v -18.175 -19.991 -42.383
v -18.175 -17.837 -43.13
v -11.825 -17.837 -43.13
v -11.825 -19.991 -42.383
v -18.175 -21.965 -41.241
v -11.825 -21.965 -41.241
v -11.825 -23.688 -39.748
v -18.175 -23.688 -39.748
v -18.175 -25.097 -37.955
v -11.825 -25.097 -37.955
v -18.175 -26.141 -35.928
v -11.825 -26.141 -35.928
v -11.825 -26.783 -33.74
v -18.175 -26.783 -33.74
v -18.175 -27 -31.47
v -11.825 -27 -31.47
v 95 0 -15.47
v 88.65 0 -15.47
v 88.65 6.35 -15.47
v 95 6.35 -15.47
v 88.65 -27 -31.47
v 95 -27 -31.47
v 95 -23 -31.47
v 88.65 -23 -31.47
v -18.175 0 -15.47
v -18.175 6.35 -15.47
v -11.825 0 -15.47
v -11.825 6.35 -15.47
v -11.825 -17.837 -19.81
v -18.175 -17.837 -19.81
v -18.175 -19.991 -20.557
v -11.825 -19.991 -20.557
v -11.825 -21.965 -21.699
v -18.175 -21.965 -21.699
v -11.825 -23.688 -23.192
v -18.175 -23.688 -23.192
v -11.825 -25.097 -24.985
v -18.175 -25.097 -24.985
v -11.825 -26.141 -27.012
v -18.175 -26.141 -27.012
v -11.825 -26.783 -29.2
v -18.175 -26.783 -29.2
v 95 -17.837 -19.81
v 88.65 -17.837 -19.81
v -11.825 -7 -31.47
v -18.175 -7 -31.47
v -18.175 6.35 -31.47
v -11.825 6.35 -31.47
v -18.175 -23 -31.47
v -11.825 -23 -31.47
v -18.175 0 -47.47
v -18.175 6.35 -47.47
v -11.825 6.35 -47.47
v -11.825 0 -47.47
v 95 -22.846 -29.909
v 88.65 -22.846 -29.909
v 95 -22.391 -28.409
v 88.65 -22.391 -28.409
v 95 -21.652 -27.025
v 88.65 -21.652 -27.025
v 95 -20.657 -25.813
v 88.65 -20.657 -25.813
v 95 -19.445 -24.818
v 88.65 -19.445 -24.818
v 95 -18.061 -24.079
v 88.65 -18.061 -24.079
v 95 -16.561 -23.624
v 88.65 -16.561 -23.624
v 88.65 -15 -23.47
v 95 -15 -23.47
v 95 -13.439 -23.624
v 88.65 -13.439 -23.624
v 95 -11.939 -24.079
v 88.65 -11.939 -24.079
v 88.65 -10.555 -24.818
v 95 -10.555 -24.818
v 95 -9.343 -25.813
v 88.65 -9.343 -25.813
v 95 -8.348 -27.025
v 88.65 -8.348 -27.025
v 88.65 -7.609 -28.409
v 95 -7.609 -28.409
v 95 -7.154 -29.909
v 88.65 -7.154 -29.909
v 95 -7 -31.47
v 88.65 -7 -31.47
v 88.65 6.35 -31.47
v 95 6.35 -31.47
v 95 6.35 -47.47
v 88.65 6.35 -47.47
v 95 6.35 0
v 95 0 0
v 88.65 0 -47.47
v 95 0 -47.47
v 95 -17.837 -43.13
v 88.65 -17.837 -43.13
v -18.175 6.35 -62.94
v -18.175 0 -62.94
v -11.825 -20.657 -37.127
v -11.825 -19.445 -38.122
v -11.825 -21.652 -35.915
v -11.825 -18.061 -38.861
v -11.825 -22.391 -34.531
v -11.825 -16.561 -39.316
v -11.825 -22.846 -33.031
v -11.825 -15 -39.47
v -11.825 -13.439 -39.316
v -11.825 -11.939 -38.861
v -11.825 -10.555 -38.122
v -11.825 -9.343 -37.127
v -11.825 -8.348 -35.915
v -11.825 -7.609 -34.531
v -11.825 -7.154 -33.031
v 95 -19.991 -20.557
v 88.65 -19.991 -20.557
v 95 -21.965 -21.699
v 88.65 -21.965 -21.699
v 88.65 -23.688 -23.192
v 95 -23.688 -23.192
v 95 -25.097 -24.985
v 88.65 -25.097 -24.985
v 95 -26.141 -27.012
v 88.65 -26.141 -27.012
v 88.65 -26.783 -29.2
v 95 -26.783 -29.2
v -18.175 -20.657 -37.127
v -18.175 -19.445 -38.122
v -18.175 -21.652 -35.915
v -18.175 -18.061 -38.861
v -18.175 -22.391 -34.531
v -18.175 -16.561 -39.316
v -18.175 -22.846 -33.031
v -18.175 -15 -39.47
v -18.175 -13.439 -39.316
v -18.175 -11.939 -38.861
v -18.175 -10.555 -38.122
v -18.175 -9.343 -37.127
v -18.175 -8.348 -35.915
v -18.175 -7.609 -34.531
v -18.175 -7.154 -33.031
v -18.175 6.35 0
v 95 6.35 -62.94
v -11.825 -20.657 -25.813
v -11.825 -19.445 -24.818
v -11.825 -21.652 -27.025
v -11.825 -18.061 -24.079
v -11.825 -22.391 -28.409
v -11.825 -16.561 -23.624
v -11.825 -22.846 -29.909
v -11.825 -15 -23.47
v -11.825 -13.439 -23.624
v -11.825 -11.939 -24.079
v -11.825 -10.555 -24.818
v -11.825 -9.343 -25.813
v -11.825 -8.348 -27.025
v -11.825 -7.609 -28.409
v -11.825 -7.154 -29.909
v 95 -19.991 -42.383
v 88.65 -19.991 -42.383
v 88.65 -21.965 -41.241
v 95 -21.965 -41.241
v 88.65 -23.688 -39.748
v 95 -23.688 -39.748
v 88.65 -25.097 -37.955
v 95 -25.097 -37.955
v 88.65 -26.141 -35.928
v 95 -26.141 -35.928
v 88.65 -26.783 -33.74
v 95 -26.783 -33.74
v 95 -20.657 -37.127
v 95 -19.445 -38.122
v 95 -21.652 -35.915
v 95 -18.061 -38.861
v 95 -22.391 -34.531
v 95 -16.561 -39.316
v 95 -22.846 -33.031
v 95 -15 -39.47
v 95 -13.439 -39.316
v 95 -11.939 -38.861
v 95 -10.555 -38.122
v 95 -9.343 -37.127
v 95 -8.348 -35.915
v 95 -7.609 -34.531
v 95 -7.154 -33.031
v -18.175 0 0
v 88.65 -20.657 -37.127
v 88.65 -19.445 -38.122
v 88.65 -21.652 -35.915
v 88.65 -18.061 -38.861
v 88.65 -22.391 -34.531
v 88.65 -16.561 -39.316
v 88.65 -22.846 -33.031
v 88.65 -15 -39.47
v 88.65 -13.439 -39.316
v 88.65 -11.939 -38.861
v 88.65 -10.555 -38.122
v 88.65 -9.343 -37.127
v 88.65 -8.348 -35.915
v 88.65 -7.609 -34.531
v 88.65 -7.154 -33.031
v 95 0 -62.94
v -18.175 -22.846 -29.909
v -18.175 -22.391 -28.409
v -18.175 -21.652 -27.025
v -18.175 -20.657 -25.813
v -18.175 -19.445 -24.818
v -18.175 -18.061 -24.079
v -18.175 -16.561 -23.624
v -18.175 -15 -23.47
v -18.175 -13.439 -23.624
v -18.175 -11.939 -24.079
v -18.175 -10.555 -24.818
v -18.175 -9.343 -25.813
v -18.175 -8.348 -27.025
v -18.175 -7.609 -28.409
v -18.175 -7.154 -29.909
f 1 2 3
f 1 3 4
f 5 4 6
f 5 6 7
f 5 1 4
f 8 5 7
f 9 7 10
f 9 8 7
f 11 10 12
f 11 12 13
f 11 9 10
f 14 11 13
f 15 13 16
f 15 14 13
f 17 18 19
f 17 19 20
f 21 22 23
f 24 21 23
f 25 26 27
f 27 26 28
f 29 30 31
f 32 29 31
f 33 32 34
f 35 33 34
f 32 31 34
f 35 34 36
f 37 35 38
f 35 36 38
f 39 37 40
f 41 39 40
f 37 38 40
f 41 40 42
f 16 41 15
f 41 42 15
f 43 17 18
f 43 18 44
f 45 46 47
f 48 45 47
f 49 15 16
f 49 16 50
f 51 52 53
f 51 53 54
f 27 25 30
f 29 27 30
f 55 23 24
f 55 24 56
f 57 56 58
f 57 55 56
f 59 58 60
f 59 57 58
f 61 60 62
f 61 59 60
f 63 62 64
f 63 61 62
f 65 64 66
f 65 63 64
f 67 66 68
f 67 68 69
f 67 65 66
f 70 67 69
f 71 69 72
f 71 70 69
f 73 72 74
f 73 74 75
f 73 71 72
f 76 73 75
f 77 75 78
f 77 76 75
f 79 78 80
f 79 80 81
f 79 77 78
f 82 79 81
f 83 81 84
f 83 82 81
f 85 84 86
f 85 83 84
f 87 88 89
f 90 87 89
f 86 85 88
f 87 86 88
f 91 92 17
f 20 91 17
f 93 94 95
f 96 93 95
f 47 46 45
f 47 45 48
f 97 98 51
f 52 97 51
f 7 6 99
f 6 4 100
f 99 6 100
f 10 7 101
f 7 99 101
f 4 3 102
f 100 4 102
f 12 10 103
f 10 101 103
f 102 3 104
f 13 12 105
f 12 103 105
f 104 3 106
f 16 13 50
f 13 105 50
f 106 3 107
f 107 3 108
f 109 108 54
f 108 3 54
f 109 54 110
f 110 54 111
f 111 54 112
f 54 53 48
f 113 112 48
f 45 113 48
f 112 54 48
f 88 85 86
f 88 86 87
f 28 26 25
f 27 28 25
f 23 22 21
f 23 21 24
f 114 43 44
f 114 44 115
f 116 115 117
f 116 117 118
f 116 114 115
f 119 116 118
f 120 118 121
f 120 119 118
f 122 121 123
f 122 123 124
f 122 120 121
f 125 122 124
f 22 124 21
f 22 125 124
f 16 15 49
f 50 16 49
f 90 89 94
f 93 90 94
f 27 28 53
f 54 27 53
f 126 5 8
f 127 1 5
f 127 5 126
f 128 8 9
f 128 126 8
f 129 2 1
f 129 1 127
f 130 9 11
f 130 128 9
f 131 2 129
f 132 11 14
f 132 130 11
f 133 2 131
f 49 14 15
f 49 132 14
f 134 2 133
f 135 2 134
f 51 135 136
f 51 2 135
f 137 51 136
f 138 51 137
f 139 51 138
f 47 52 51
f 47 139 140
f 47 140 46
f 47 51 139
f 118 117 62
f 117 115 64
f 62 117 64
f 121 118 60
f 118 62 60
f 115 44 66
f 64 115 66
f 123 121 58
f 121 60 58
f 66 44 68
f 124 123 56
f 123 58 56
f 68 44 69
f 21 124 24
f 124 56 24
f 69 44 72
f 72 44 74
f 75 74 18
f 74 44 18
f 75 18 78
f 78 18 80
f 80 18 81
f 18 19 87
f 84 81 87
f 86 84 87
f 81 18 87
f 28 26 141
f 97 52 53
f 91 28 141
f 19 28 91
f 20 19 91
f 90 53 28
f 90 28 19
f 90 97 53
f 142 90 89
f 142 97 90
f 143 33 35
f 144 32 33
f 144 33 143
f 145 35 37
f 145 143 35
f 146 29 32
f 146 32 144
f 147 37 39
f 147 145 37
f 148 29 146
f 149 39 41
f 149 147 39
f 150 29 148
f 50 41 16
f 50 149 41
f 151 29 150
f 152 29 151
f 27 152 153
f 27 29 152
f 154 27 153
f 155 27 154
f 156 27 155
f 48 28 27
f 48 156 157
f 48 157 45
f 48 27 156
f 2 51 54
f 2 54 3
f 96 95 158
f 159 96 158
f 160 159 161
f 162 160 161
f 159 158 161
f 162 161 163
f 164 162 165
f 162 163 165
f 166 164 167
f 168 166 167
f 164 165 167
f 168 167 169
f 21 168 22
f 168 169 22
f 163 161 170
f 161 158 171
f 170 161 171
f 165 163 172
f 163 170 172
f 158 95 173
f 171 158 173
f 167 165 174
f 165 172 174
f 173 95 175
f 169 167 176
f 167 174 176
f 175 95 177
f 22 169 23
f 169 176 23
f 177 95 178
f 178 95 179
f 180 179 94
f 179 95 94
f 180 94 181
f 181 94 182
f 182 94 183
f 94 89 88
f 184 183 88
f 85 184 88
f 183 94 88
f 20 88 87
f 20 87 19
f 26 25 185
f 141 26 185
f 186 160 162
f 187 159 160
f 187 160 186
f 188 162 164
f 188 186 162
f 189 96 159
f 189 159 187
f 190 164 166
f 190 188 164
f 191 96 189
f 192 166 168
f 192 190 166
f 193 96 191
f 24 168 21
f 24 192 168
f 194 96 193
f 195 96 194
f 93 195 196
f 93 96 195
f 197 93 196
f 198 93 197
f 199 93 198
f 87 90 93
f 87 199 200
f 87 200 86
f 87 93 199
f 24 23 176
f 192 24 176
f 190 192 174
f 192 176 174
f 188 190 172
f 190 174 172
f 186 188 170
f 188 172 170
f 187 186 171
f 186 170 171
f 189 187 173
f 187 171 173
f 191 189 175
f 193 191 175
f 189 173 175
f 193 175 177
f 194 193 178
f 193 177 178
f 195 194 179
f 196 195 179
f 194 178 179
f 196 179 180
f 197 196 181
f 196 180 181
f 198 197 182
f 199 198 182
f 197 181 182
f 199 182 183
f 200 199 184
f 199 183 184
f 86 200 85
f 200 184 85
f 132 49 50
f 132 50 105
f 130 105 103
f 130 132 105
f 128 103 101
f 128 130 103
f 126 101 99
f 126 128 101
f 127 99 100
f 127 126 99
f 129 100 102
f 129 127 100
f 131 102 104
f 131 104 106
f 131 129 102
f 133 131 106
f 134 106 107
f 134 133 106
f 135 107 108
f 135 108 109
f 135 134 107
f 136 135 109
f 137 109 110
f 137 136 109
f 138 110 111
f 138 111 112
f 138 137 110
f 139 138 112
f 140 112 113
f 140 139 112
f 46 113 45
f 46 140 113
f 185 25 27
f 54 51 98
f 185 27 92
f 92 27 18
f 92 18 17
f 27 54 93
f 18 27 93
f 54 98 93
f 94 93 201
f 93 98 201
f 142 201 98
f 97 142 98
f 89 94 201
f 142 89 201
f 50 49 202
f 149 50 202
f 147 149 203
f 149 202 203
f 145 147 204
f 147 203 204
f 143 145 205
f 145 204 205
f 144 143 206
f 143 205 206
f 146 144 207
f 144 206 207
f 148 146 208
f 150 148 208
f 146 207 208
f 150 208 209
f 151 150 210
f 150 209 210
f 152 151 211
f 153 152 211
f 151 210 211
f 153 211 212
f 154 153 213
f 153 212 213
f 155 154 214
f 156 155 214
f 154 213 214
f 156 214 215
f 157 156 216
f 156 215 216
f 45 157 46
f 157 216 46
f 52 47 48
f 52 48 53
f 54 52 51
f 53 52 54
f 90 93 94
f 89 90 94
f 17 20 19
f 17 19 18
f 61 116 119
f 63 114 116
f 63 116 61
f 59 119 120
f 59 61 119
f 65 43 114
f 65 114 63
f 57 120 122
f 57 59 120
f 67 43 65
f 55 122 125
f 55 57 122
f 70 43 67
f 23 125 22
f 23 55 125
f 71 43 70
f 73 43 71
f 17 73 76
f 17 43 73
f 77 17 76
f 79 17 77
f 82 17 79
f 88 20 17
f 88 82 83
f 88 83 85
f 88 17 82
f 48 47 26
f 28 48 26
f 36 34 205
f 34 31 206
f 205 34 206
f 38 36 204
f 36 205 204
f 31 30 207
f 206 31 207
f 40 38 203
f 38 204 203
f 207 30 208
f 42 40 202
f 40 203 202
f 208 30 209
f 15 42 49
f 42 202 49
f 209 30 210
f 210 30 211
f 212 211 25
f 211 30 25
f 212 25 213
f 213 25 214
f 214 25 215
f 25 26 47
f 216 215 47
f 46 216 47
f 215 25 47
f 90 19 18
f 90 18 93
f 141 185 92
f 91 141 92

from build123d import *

# Parameters (mm, degrees)
EXTRUDE_1_DEPTH     = 6.35
SKETCH_4_W          = 12.7
SKETCH_4_H          = 32
CUT_EXTRUDE_1_DEPTH = 16.35
EXTRUDE_2_DEPTH     = 6.35


with BuildPart() as part:
    # 草图1 → 凸台-拉伸1 (new body)
    with BuildSketch(Plane(origin=(0, 0, 0), x_dir=(1, 0, 0), z_dir=(0, 1, 0))):
        Polygon((-3.175, 0), (0, 0), (35, 0), (41.35, 0), (95, 0), (95, 62.94), (41.35, 62.94), (35, 62.94), (0, 62.94), (-3.175, 62.94), (-18.175, 62.94), (-18.175, 0), align=None)
    extrude(amount=EXTRUDE_1_DEPTH)

    # 草图4 → 切除-拉伸1 (cut)
    with BuildSketch(Plane(origin=(0, 6.35, 0), x_dir=(1, 0, 0), z_dir=(0, 1, 0))):
        with Locations((-18.175, 31.47)):
            Rectangle(SKETCH_4_W, SKETCH_4_H)
        with Locations((95, 31.47)):
            Rectangle(SKETCH_4_W, SKETCH_4_H)
    extrude(amount=-CUT_EXTRUDE_1_DEPTH, mode=Mode.SUBTRACT)


with BuildPart() as body_2:
    # 草图5 → 凸台-拉伸2 (new body)
    with BuildSketch(Plane(origin=(95, 0, 0), x_dir=(0, 0, -1), z_dir=(1, 0, 0))):
        with BuildLine():
            Line((15.47, 6.35), (15.47, 0))
            Line((15.47, 0), (19.81020633, -17.837113248))
            ThreePointArc((19.81020633, -17.837113248), (24.055330721, -24.435183066), (31.47, -27))
            Line((31.47, -27), (31.47, -23))
            ThreePointArc((31.47, -23), (23.47, -15), (31.47, -7))
            Line((31.47, -7), (31.47, 6.35))
            Line((31.47, 6.35), (15.47, 6.35))
        make_face()
    extrude(amount=-EXTRUDE_2_DEPTH)


with BuildPart() as body_3:
    # 镜向1: mirrored copy
    add(body_2.part.mirror(Plane.ZY.offset(-38.4125)))


with BuildPart() as body_4:
    # 镜向2: mirrored copy
    add(body_2.part.mirror(Plane(origin=(25.164491751, 0, -31.47), x_dir=(1, 0, 0), z_dir=(0, 0, -1))))


with BuildPart() as body_5:
    # Mirror 2 2: mirrored copy
    add(body_3.part.mirror(Plane(origin=(25.164491751, 0, -31.47), x_dir=(1, 0, 0), z_dir=(0, 0, -1))))


solid = Compound([part.part, body_2.part, body_3.part, body_4.part, body_5.part])
